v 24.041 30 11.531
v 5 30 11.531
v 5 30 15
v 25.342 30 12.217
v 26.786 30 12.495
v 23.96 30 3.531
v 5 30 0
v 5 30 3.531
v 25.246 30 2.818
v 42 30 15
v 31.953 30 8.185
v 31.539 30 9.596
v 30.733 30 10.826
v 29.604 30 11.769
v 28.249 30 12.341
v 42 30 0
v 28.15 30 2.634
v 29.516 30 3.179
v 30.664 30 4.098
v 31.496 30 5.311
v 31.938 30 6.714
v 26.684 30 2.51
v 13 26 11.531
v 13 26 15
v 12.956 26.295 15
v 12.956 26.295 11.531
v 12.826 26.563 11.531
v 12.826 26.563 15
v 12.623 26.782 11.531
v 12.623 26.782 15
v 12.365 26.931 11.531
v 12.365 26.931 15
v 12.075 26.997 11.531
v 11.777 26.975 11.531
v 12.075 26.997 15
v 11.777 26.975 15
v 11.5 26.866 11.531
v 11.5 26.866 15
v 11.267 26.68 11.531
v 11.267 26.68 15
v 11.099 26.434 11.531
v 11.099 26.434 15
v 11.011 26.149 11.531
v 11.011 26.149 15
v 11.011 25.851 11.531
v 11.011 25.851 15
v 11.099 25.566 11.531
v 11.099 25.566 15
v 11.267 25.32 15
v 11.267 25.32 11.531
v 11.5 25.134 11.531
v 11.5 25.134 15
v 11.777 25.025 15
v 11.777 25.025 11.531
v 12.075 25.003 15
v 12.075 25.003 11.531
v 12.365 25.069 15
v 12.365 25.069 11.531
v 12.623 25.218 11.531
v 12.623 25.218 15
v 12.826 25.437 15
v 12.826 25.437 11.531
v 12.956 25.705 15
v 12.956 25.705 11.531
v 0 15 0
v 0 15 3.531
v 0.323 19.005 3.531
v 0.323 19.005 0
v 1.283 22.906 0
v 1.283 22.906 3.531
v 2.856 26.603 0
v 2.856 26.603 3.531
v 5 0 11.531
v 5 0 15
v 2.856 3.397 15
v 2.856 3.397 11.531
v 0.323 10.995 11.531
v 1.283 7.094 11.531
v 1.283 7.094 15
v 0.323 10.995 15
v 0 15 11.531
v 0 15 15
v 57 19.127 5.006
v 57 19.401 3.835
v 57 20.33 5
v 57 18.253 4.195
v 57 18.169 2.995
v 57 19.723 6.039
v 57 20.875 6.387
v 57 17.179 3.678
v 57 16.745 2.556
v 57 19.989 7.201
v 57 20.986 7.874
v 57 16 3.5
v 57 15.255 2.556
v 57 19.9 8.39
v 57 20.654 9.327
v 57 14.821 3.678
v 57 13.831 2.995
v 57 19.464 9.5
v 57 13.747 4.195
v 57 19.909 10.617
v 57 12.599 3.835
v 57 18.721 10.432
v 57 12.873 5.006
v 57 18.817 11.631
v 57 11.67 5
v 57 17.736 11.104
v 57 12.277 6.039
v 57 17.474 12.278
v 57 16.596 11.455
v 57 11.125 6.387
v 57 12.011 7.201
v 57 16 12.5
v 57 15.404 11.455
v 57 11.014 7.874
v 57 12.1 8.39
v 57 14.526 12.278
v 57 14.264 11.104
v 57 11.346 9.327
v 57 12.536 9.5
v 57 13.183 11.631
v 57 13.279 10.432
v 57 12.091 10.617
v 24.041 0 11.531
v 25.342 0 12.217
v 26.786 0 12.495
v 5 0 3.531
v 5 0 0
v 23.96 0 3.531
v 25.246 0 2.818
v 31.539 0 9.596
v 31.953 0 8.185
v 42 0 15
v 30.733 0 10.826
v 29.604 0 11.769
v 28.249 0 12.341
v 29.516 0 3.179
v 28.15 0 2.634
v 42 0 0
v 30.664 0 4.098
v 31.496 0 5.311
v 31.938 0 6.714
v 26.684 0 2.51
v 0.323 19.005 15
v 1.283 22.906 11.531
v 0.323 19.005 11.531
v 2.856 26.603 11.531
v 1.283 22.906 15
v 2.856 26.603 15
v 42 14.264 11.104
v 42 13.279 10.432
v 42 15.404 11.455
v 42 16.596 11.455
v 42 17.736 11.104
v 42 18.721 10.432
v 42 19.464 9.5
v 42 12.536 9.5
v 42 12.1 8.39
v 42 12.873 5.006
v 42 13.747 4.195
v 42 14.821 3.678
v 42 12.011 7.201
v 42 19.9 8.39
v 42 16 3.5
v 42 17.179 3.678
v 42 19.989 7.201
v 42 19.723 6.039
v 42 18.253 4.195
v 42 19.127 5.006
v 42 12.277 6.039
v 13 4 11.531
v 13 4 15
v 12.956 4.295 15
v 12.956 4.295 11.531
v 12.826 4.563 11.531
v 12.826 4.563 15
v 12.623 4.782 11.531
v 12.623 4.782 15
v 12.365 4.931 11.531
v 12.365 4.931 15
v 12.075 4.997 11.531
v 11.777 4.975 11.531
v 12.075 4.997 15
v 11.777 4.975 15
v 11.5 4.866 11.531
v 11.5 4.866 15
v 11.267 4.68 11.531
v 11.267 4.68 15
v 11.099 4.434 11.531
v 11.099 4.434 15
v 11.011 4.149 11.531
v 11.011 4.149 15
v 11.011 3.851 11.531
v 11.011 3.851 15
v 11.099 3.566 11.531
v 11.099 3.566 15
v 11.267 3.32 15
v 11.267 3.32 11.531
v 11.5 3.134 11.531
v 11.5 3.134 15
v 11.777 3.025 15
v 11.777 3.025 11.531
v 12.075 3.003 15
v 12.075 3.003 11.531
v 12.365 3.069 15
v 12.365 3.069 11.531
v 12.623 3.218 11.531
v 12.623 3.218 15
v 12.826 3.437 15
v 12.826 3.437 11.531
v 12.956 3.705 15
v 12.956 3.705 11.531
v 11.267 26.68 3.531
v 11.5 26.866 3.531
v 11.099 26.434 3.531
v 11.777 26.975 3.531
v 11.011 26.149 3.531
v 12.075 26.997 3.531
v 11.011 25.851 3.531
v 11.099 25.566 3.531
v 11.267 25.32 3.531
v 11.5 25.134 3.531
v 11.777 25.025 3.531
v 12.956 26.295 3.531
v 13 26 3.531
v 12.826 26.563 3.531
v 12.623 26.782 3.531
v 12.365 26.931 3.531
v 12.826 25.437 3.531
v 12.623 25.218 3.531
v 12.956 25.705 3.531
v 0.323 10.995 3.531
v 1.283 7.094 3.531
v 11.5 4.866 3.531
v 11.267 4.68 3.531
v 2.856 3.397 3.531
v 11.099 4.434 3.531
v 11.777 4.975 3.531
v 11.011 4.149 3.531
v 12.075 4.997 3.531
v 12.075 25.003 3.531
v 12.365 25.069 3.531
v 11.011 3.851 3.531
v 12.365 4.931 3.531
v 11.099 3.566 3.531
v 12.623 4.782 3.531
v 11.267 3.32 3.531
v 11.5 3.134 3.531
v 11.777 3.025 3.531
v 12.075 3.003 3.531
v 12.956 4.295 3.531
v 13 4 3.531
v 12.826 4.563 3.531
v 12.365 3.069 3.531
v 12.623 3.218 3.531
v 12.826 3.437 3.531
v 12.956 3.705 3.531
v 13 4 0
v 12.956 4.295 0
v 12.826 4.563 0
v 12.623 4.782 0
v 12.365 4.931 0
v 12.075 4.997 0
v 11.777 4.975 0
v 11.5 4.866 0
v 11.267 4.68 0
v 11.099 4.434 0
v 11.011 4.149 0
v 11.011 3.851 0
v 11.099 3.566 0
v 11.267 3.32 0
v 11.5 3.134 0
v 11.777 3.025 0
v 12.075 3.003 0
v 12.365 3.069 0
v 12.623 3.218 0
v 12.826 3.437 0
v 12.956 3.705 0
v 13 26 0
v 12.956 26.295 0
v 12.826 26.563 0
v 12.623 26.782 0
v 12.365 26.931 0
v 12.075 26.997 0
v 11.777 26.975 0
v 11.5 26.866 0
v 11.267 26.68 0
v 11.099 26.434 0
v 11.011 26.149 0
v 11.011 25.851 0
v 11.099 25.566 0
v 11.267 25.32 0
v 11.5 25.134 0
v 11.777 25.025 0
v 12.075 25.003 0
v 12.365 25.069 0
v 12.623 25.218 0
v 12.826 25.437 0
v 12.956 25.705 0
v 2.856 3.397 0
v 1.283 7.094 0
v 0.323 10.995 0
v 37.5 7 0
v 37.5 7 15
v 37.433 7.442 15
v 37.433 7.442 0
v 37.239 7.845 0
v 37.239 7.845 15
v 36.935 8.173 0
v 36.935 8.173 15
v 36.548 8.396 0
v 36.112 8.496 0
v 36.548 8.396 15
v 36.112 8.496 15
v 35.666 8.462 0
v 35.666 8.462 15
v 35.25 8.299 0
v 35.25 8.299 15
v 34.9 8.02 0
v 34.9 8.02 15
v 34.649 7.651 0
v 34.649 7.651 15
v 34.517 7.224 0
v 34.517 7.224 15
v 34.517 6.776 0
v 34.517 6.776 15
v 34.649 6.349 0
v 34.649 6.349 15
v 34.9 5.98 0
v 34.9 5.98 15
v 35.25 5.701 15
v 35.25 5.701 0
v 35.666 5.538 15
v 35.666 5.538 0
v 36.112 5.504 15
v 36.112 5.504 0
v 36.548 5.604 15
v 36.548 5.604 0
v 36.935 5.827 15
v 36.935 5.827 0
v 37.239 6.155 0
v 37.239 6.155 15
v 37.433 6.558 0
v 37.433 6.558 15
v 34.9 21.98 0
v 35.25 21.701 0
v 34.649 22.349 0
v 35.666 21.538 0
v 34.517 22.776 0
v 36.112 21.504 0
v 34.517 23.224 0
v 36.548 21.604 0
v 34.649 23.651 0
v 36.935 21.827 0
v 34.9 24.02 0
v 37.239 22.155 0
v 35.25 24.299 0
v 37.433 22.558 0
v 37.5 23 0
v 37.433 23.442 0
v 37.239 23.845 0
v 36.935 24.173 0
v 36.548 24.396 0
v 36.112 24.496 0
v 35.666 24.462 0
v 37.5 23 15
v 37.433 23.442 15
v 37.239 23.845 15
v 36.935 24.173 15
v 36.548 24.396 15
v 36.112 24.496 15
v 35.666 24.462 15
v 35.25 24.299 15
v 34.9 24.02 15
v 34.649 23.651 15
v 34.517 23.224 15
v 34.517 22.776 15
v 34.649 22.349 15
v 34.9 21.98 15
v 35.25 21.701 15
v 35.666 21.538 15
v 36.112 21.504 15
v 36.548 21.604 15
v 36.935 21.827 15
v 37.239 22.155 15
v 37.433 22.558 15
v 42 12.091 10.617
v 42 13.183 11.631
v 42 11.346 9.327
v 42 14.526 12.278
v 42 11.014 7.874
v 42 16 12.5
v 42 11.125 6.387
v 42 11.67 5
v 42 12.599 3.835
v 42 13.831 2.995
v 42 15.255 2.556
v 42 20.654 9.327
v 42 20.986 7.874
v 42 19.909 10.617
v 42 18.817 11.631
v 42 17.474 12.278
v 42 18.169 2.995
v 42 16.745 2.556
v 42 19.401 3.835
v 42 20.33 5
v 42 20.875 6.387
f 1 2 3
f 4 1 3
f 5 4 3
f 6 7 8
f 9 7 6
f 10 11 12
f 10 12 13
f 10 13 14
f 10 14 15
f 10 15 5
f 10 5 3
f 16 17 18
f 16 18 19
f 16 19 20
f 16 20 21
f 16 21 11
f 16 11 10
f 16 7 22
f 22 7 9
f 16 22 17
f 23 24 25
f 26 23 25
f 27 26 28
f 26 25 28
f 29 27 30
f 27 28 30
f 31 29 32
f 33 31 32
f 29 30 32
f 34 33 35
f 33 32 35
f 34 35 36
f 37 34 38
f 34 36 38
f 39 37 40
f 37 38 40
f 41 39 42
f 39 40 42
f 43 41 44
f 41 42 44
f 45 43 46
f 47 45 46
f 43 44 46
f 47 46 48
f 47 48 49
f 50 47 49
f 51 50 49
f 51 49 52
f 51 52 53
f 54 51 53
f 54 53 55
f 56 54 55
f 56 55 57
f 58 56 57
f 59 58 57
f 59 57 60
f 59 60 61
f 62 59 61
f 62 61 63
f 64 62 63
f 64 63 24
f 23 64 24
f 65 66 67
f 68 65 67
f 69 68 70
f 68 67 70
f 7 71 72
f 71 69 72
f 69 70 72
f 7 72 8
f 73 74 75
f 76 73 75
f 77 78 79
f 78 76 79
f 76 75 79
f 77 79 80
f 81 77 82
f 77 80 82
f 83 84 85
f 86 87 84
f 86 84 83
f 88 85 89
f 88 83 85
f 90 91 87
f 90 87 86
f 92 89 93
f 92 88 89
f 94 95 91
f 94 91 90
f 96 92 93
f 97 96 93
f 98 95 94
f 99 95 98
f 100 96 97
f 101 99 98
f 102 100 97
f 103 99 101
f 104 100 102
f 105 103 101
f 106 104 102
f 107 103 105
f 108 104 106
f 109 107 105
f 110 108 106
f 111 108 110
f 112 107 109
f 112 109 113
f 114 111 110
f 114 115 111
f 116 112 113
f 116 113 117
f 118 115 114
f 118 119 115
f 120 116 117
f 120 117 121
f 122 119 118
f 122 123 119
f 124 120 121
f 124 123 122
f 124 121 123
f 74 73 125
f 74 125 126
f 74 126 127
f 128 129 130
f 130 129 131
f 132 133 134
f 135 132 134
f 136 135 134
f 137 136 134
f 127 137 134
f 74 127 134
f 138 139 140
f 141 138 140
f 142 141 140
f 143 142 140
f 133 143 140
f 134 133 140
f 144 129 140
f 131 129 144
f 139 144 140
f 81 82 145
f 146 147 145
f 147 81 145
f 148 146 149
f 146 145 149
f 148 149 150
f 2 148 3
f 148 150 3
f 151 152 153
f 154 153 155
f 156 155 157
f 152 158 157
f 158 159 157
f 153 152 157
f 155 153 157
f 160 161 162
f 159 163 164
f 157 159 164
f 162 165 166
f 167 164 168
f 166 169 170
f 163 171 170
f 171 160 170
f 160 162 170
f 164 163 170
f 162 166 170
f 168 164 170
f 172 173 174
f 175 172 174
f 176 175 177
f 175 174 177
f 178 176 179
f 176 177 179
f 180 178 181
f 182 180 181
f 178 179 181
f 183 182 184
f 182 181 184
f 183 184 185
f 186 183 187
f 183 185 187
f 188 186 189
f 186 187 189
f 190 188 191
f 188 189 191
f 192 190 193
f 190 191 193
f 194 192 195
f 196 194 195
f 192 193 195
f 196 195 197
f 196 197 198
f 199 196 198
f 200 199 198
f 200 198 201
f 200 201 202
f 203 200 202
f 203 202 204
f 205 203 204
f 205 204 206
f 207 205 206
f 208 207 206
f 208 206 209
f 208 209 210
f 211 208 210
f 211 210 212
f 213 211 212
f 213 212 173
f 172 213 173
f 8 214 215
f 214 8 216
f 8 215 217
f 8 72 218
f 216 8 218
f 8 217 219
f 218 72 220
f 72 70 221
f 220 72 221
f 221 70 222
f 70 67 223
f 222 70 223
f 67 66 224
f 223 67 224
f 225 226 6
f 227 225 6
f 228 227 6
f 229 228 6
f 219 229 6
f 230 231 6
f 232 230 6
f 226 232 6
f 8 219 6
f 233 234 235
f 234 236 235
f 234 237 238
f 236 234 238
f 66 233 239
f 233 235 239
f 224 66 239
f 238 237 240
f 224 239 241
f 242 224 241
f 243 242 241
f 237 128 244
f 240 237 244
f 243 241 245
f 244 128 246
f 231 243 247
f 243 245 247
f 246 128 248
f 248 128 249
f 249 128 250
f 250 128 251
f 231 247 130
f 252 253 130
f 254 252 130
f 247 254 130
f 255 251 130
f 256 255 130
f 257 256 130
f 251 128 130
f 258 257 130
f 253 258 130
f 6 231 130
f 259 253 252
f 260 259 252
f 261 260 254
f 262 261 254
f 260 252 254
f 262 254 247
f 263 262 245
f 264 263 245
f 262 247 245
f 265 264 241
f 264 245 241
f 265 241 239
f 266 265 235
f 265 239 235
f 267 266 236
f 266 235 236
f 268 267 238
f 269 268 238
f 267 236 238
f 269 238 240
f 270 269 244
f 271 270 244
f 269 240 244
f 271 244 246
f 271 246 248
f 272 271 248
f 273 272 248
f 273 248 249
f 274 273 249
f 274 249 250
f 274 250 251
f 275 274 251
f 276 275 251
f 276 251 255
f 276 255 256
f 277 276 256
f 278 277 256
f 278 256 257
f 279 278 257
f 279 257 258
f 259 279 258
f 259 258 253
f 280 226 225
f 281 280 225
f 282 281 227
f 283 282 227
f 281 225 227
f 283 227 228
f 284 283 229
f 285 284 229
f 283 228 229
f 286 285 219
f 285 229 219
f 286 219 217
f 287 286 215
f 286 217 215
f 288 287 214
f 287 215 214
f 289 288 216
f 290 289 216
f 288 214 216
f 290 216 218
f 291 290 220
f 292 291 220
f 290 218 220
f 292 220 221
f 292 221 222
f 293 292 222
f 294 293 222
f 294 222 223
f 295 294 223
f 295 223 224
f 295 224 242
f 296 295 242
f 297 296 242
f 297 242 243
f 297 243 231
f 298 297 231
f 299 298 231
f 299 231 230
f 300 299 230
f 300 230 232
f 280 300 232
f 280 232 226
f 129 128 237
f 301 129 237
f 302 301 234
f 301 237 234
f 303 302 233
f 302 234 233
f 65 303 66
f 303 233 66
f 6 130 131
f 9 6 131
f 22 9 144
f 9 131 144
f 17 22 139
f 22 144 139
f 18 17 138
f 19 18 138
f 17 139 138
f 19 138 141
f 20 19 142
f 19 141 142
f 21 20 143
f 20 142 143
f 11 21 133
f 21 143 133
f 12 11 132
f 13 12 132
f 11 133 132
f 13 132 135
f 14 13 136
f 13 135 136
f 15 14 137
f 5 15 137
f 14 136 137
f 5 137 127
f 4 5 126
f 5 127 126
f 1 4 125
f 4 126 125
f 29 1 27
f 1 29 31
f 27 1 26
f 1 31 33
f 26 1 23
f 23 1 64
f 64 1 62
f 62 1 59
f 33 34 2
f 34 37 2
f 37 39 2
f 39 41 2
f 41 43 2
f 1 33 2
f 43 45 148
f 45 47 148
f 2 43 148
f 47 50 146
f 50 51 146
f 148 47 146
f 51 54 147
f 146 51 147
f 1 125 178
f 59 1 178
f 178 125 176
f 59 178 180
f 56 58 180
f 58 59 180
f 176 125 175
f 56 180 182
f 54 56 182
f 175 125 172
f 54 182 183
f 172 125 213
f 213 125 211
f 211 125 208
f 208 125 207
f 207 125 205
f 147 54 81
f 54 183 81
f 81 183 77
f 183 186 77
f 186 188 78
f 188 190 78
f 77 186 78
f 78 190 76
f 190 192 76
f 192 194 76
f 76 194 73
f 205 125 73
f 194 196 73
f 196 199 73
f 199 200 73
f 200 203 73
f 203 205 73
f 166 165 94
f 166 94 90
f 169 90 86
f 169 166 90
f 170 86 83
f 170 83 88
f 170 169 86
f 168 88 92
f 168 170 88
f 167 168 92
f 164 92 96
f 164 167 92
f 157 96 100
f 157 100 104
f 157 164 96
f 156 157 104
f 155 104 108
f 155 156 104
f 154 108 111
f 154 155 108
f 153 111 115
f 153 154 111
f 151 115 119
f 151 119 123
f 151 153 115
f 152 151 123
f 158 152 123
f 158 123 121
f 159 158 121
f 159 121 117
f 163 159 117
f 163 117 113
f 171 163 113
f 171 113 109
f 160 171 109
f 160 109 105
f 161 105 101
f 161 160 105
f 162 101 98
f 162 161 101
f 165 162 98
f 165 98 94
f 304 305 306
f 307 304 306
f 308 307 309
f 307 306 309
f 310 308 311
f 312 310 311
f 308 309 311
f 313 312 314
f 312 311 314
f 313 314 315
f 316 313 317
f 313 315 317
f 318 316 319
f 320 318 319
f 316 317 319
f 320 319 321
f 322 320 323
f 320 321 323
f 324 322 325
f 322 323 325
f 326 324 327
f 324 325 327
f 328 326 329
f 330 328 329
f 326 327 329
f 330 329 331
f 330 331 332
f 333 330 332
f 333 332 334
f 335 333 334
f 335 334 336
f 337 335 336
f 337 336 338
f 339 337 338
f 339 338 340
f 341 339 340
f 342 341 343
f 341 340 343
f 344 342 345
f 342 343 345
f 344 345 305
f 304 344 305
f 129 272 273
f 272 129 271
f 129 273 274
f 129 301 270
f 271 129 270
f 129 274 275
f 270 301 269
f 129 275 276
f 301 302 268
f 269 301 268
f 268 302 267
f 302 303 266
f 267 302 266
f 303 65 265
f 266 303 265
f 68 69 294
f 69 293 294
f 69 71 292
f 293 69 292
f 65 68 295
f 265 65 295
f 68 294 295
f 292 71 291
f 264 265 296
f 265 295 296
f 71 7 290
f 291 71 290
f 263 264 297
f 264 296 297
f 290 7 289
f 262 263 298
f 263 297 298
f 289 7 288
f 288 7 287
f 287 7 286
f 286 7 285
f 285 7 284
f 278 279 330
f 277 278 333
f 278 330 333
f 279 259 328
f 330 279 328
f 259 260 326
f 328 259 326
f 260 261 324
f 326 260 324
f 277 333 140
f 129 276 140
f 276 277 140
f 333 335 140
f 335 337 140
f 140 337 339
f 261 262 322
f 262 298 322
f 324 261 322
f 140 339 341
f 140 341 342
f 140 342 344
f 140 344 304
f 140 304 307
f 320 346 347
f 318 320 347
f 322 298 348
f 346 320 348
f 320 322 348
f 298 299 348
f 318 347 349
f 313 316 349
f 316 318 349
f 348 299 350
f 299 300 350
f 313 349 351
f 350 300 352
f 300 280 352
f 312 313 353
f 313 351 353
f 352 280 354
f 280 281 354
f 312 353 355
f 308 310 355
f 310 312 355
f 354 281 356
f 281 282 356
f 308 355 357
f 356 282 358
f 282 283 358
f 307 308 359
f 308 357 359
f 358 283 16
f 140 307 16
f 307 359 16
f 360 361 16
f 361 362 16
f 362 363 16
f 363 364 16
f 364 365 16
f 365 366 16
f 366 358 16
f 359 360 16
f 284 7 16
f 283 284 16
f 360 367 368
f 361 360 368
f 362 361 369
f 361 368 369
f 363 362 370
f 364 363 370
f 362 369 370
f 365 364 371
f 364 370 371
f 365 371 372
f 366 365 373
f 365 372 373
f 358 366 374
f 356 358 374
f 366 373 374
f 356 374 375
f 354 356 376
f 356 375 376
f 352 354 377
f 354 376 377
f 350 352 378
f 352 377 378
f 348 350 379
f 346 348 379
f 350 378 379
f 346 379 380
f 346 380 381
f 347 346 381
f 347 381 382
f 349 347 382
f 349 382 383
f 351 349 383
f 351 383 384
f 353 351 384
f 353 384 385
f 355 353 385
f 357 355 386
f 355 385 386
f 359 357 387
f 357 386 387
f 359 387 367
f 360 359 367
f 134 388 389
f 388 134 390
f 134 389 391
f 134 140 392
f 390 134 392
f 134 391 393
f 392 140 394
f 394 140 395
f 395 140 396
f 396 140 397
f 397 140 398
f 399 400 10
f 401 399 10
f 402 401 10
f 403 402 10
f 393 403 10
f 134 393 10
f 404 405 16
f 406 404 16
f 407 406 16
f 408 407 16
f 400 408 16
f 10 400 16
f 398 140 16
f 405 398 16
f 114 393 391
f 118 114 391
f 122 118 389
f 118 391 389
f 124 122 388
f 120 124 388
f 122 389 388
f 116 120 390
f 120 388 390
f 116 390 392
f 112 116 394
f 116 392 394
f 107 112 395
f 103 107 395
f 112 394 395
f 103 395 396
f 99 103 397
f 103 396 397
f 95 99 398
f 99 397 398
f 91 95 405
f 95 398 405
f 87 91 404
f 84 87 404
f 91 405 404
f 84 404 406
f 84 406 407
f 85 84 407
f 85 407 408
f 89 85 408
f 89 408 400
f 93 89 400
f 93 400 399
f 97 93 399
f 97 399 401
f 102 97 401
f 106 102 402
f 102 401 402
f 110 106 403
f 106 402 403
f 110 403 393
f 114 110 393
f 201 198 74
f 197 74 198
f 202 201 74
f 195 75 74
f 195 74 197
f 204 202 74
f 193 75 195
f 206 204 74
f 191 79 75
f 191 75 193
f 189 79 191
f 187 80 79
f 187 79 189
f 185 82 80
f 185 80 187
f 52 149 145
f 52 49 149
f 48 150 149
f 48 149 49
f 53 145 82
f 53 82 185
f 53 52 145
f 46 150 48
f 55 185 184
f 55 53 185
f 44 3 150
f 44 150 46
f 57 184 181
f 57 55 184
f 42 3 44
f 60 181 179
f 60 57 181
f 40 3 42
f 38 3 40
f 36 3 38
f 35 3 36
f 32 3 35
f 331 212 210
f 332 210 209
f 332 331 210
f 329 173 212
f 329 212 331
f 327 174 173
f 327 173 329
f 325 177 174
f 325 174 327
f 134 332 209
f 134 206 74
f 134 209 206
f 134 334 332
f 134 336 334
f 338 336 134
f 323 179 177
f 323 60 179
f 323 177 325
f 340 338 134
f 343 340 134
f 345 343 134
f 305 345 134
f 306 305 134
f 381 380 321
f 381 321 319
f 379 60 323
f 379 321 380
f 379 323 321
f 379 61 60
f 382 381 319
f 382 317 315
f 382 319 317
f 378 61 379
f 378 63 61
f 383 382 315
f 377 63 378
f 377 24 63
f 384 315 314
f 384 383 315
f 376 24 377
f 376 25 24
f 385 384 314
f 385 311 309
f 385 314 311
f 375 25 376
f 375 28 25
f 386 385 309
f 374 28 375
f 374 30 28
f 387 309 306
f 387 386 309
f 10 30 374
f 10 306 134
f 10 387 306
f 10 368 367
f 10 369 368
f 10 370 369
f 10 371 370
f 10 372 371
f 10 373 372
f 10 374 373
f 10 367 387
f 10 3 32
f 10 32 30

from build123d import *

# Parameters (mm, degrees)
SKETCH1_W           = 42
SKETCH1_H           = 30
BOSS_EXTRUDE1_DEPTH = 15
SKETCH3_R           = 1.5
CUT_EXTRUDE1_DEPTH  = 15
SKETCH4_R           = 5
SKETCH4_R_2         = 4
BOSS_EXTRUDE2_DEPTH = 15
CUT_EXTRUDE2_DEPTH  = 30
CUT_EXTRUDE3_DEPTH  = 30
SKETCH7_R           = 1
CUT_EXTRUDE4_DEPTH  = 30


with BuildPart() as part:
    # Sketch1 → Boss-Extrude1 (new body)
    with BuildSketch(Plane.XY):
        with Locations((21, 15)):
            Rectangle(SKETCH1_W, SKETCH1_H)
    extrude(amount=BOSS_EXTRUDE1_DEPTH)

    # Sketch3 → Cut-Extrude1 (cut)
    with BuildSketch(Plane.XY.offset(15)):
        with Locations((36, 23)):
            Circle(SKETCH3_R)
        with Locations((36, 7)):
            Circle(SKETCH3_R)
    extrude(amount=-CUT_EXTRUDE1_DEPTH, mode=Mode.SUBTRACT)

    # Sketch4 → Boss-Extrude2 (add)
    with BuildSketch(Plane(origin=(42, 0, 0), x_dir=(0, 0, -1), z_dir=(1, 0, 0))):
        with Locations(Location((-7.5, 16, 0), (0, 0, 180))):
            Circle(SKETCH4_R)
        with Locations((-7.5, 16)):
            Circle(SKETCH4_R_2, mode=Mode.SUBTRACT)
    extrude(amount=BOSS_EXTRUDE2_DEPTH)

    # Sketch5 → Cut-Extrude2 (cut)
    with BuildSketch(Plane.XZ):
        with BuildLine():
            Line((24.041336888, 11.530671481), (0, 11.530671481))
            Line((0, 11.530671481), (0, 3.530671481))
            Line((0, 3.530671481), (23.959534392, 3.530671481))
            ThreePointArc((23.959534392, 3.530671481), (31.999738628, 7.448876113), (24.041336888, 11.530671481))
        make_face()
    extrude(amount=-CUT_EXTRUDE2_DEPTH, mode=Mode.SUBTRACT)

    # Sketch6 → Cut-Extrude3 (cut)
    with BuildSketch(Plane.XY.offset(15)):
        with BuildLine():
            ThreePointArc((0, 15), (1.282917549, 22.90569415), (5, 30))
            Line((5, 30), (0, 30))
            Line((0, 30), (0, 15))
        make_face()
        with BuildLine():
            ThreePointArc((5, 0), (1.282917549, 7.09430585), (0, 15))
            Line((0, 15), (0, 0))
            Line((0, 0), (5, 0))
        make_face()
    extrude(amount=-CUT_EXTRUDE3_DEPTH, mode=Mode.SUBTRACT)

    # Sketch7 → Cut-Extrude4 (cut)
    with BuildSketch(Plane.XY.offset(15)):
        with Locations((12, 26)):
            Circle(SKETCH7_R)
        with Locations((12, 4)):
            Circle(SKETCH7_R)
    extrude(amount=-CUT_EXTRUDE4_DEPTH, mode=Mode.SUBTRACT)


solid = part.part
